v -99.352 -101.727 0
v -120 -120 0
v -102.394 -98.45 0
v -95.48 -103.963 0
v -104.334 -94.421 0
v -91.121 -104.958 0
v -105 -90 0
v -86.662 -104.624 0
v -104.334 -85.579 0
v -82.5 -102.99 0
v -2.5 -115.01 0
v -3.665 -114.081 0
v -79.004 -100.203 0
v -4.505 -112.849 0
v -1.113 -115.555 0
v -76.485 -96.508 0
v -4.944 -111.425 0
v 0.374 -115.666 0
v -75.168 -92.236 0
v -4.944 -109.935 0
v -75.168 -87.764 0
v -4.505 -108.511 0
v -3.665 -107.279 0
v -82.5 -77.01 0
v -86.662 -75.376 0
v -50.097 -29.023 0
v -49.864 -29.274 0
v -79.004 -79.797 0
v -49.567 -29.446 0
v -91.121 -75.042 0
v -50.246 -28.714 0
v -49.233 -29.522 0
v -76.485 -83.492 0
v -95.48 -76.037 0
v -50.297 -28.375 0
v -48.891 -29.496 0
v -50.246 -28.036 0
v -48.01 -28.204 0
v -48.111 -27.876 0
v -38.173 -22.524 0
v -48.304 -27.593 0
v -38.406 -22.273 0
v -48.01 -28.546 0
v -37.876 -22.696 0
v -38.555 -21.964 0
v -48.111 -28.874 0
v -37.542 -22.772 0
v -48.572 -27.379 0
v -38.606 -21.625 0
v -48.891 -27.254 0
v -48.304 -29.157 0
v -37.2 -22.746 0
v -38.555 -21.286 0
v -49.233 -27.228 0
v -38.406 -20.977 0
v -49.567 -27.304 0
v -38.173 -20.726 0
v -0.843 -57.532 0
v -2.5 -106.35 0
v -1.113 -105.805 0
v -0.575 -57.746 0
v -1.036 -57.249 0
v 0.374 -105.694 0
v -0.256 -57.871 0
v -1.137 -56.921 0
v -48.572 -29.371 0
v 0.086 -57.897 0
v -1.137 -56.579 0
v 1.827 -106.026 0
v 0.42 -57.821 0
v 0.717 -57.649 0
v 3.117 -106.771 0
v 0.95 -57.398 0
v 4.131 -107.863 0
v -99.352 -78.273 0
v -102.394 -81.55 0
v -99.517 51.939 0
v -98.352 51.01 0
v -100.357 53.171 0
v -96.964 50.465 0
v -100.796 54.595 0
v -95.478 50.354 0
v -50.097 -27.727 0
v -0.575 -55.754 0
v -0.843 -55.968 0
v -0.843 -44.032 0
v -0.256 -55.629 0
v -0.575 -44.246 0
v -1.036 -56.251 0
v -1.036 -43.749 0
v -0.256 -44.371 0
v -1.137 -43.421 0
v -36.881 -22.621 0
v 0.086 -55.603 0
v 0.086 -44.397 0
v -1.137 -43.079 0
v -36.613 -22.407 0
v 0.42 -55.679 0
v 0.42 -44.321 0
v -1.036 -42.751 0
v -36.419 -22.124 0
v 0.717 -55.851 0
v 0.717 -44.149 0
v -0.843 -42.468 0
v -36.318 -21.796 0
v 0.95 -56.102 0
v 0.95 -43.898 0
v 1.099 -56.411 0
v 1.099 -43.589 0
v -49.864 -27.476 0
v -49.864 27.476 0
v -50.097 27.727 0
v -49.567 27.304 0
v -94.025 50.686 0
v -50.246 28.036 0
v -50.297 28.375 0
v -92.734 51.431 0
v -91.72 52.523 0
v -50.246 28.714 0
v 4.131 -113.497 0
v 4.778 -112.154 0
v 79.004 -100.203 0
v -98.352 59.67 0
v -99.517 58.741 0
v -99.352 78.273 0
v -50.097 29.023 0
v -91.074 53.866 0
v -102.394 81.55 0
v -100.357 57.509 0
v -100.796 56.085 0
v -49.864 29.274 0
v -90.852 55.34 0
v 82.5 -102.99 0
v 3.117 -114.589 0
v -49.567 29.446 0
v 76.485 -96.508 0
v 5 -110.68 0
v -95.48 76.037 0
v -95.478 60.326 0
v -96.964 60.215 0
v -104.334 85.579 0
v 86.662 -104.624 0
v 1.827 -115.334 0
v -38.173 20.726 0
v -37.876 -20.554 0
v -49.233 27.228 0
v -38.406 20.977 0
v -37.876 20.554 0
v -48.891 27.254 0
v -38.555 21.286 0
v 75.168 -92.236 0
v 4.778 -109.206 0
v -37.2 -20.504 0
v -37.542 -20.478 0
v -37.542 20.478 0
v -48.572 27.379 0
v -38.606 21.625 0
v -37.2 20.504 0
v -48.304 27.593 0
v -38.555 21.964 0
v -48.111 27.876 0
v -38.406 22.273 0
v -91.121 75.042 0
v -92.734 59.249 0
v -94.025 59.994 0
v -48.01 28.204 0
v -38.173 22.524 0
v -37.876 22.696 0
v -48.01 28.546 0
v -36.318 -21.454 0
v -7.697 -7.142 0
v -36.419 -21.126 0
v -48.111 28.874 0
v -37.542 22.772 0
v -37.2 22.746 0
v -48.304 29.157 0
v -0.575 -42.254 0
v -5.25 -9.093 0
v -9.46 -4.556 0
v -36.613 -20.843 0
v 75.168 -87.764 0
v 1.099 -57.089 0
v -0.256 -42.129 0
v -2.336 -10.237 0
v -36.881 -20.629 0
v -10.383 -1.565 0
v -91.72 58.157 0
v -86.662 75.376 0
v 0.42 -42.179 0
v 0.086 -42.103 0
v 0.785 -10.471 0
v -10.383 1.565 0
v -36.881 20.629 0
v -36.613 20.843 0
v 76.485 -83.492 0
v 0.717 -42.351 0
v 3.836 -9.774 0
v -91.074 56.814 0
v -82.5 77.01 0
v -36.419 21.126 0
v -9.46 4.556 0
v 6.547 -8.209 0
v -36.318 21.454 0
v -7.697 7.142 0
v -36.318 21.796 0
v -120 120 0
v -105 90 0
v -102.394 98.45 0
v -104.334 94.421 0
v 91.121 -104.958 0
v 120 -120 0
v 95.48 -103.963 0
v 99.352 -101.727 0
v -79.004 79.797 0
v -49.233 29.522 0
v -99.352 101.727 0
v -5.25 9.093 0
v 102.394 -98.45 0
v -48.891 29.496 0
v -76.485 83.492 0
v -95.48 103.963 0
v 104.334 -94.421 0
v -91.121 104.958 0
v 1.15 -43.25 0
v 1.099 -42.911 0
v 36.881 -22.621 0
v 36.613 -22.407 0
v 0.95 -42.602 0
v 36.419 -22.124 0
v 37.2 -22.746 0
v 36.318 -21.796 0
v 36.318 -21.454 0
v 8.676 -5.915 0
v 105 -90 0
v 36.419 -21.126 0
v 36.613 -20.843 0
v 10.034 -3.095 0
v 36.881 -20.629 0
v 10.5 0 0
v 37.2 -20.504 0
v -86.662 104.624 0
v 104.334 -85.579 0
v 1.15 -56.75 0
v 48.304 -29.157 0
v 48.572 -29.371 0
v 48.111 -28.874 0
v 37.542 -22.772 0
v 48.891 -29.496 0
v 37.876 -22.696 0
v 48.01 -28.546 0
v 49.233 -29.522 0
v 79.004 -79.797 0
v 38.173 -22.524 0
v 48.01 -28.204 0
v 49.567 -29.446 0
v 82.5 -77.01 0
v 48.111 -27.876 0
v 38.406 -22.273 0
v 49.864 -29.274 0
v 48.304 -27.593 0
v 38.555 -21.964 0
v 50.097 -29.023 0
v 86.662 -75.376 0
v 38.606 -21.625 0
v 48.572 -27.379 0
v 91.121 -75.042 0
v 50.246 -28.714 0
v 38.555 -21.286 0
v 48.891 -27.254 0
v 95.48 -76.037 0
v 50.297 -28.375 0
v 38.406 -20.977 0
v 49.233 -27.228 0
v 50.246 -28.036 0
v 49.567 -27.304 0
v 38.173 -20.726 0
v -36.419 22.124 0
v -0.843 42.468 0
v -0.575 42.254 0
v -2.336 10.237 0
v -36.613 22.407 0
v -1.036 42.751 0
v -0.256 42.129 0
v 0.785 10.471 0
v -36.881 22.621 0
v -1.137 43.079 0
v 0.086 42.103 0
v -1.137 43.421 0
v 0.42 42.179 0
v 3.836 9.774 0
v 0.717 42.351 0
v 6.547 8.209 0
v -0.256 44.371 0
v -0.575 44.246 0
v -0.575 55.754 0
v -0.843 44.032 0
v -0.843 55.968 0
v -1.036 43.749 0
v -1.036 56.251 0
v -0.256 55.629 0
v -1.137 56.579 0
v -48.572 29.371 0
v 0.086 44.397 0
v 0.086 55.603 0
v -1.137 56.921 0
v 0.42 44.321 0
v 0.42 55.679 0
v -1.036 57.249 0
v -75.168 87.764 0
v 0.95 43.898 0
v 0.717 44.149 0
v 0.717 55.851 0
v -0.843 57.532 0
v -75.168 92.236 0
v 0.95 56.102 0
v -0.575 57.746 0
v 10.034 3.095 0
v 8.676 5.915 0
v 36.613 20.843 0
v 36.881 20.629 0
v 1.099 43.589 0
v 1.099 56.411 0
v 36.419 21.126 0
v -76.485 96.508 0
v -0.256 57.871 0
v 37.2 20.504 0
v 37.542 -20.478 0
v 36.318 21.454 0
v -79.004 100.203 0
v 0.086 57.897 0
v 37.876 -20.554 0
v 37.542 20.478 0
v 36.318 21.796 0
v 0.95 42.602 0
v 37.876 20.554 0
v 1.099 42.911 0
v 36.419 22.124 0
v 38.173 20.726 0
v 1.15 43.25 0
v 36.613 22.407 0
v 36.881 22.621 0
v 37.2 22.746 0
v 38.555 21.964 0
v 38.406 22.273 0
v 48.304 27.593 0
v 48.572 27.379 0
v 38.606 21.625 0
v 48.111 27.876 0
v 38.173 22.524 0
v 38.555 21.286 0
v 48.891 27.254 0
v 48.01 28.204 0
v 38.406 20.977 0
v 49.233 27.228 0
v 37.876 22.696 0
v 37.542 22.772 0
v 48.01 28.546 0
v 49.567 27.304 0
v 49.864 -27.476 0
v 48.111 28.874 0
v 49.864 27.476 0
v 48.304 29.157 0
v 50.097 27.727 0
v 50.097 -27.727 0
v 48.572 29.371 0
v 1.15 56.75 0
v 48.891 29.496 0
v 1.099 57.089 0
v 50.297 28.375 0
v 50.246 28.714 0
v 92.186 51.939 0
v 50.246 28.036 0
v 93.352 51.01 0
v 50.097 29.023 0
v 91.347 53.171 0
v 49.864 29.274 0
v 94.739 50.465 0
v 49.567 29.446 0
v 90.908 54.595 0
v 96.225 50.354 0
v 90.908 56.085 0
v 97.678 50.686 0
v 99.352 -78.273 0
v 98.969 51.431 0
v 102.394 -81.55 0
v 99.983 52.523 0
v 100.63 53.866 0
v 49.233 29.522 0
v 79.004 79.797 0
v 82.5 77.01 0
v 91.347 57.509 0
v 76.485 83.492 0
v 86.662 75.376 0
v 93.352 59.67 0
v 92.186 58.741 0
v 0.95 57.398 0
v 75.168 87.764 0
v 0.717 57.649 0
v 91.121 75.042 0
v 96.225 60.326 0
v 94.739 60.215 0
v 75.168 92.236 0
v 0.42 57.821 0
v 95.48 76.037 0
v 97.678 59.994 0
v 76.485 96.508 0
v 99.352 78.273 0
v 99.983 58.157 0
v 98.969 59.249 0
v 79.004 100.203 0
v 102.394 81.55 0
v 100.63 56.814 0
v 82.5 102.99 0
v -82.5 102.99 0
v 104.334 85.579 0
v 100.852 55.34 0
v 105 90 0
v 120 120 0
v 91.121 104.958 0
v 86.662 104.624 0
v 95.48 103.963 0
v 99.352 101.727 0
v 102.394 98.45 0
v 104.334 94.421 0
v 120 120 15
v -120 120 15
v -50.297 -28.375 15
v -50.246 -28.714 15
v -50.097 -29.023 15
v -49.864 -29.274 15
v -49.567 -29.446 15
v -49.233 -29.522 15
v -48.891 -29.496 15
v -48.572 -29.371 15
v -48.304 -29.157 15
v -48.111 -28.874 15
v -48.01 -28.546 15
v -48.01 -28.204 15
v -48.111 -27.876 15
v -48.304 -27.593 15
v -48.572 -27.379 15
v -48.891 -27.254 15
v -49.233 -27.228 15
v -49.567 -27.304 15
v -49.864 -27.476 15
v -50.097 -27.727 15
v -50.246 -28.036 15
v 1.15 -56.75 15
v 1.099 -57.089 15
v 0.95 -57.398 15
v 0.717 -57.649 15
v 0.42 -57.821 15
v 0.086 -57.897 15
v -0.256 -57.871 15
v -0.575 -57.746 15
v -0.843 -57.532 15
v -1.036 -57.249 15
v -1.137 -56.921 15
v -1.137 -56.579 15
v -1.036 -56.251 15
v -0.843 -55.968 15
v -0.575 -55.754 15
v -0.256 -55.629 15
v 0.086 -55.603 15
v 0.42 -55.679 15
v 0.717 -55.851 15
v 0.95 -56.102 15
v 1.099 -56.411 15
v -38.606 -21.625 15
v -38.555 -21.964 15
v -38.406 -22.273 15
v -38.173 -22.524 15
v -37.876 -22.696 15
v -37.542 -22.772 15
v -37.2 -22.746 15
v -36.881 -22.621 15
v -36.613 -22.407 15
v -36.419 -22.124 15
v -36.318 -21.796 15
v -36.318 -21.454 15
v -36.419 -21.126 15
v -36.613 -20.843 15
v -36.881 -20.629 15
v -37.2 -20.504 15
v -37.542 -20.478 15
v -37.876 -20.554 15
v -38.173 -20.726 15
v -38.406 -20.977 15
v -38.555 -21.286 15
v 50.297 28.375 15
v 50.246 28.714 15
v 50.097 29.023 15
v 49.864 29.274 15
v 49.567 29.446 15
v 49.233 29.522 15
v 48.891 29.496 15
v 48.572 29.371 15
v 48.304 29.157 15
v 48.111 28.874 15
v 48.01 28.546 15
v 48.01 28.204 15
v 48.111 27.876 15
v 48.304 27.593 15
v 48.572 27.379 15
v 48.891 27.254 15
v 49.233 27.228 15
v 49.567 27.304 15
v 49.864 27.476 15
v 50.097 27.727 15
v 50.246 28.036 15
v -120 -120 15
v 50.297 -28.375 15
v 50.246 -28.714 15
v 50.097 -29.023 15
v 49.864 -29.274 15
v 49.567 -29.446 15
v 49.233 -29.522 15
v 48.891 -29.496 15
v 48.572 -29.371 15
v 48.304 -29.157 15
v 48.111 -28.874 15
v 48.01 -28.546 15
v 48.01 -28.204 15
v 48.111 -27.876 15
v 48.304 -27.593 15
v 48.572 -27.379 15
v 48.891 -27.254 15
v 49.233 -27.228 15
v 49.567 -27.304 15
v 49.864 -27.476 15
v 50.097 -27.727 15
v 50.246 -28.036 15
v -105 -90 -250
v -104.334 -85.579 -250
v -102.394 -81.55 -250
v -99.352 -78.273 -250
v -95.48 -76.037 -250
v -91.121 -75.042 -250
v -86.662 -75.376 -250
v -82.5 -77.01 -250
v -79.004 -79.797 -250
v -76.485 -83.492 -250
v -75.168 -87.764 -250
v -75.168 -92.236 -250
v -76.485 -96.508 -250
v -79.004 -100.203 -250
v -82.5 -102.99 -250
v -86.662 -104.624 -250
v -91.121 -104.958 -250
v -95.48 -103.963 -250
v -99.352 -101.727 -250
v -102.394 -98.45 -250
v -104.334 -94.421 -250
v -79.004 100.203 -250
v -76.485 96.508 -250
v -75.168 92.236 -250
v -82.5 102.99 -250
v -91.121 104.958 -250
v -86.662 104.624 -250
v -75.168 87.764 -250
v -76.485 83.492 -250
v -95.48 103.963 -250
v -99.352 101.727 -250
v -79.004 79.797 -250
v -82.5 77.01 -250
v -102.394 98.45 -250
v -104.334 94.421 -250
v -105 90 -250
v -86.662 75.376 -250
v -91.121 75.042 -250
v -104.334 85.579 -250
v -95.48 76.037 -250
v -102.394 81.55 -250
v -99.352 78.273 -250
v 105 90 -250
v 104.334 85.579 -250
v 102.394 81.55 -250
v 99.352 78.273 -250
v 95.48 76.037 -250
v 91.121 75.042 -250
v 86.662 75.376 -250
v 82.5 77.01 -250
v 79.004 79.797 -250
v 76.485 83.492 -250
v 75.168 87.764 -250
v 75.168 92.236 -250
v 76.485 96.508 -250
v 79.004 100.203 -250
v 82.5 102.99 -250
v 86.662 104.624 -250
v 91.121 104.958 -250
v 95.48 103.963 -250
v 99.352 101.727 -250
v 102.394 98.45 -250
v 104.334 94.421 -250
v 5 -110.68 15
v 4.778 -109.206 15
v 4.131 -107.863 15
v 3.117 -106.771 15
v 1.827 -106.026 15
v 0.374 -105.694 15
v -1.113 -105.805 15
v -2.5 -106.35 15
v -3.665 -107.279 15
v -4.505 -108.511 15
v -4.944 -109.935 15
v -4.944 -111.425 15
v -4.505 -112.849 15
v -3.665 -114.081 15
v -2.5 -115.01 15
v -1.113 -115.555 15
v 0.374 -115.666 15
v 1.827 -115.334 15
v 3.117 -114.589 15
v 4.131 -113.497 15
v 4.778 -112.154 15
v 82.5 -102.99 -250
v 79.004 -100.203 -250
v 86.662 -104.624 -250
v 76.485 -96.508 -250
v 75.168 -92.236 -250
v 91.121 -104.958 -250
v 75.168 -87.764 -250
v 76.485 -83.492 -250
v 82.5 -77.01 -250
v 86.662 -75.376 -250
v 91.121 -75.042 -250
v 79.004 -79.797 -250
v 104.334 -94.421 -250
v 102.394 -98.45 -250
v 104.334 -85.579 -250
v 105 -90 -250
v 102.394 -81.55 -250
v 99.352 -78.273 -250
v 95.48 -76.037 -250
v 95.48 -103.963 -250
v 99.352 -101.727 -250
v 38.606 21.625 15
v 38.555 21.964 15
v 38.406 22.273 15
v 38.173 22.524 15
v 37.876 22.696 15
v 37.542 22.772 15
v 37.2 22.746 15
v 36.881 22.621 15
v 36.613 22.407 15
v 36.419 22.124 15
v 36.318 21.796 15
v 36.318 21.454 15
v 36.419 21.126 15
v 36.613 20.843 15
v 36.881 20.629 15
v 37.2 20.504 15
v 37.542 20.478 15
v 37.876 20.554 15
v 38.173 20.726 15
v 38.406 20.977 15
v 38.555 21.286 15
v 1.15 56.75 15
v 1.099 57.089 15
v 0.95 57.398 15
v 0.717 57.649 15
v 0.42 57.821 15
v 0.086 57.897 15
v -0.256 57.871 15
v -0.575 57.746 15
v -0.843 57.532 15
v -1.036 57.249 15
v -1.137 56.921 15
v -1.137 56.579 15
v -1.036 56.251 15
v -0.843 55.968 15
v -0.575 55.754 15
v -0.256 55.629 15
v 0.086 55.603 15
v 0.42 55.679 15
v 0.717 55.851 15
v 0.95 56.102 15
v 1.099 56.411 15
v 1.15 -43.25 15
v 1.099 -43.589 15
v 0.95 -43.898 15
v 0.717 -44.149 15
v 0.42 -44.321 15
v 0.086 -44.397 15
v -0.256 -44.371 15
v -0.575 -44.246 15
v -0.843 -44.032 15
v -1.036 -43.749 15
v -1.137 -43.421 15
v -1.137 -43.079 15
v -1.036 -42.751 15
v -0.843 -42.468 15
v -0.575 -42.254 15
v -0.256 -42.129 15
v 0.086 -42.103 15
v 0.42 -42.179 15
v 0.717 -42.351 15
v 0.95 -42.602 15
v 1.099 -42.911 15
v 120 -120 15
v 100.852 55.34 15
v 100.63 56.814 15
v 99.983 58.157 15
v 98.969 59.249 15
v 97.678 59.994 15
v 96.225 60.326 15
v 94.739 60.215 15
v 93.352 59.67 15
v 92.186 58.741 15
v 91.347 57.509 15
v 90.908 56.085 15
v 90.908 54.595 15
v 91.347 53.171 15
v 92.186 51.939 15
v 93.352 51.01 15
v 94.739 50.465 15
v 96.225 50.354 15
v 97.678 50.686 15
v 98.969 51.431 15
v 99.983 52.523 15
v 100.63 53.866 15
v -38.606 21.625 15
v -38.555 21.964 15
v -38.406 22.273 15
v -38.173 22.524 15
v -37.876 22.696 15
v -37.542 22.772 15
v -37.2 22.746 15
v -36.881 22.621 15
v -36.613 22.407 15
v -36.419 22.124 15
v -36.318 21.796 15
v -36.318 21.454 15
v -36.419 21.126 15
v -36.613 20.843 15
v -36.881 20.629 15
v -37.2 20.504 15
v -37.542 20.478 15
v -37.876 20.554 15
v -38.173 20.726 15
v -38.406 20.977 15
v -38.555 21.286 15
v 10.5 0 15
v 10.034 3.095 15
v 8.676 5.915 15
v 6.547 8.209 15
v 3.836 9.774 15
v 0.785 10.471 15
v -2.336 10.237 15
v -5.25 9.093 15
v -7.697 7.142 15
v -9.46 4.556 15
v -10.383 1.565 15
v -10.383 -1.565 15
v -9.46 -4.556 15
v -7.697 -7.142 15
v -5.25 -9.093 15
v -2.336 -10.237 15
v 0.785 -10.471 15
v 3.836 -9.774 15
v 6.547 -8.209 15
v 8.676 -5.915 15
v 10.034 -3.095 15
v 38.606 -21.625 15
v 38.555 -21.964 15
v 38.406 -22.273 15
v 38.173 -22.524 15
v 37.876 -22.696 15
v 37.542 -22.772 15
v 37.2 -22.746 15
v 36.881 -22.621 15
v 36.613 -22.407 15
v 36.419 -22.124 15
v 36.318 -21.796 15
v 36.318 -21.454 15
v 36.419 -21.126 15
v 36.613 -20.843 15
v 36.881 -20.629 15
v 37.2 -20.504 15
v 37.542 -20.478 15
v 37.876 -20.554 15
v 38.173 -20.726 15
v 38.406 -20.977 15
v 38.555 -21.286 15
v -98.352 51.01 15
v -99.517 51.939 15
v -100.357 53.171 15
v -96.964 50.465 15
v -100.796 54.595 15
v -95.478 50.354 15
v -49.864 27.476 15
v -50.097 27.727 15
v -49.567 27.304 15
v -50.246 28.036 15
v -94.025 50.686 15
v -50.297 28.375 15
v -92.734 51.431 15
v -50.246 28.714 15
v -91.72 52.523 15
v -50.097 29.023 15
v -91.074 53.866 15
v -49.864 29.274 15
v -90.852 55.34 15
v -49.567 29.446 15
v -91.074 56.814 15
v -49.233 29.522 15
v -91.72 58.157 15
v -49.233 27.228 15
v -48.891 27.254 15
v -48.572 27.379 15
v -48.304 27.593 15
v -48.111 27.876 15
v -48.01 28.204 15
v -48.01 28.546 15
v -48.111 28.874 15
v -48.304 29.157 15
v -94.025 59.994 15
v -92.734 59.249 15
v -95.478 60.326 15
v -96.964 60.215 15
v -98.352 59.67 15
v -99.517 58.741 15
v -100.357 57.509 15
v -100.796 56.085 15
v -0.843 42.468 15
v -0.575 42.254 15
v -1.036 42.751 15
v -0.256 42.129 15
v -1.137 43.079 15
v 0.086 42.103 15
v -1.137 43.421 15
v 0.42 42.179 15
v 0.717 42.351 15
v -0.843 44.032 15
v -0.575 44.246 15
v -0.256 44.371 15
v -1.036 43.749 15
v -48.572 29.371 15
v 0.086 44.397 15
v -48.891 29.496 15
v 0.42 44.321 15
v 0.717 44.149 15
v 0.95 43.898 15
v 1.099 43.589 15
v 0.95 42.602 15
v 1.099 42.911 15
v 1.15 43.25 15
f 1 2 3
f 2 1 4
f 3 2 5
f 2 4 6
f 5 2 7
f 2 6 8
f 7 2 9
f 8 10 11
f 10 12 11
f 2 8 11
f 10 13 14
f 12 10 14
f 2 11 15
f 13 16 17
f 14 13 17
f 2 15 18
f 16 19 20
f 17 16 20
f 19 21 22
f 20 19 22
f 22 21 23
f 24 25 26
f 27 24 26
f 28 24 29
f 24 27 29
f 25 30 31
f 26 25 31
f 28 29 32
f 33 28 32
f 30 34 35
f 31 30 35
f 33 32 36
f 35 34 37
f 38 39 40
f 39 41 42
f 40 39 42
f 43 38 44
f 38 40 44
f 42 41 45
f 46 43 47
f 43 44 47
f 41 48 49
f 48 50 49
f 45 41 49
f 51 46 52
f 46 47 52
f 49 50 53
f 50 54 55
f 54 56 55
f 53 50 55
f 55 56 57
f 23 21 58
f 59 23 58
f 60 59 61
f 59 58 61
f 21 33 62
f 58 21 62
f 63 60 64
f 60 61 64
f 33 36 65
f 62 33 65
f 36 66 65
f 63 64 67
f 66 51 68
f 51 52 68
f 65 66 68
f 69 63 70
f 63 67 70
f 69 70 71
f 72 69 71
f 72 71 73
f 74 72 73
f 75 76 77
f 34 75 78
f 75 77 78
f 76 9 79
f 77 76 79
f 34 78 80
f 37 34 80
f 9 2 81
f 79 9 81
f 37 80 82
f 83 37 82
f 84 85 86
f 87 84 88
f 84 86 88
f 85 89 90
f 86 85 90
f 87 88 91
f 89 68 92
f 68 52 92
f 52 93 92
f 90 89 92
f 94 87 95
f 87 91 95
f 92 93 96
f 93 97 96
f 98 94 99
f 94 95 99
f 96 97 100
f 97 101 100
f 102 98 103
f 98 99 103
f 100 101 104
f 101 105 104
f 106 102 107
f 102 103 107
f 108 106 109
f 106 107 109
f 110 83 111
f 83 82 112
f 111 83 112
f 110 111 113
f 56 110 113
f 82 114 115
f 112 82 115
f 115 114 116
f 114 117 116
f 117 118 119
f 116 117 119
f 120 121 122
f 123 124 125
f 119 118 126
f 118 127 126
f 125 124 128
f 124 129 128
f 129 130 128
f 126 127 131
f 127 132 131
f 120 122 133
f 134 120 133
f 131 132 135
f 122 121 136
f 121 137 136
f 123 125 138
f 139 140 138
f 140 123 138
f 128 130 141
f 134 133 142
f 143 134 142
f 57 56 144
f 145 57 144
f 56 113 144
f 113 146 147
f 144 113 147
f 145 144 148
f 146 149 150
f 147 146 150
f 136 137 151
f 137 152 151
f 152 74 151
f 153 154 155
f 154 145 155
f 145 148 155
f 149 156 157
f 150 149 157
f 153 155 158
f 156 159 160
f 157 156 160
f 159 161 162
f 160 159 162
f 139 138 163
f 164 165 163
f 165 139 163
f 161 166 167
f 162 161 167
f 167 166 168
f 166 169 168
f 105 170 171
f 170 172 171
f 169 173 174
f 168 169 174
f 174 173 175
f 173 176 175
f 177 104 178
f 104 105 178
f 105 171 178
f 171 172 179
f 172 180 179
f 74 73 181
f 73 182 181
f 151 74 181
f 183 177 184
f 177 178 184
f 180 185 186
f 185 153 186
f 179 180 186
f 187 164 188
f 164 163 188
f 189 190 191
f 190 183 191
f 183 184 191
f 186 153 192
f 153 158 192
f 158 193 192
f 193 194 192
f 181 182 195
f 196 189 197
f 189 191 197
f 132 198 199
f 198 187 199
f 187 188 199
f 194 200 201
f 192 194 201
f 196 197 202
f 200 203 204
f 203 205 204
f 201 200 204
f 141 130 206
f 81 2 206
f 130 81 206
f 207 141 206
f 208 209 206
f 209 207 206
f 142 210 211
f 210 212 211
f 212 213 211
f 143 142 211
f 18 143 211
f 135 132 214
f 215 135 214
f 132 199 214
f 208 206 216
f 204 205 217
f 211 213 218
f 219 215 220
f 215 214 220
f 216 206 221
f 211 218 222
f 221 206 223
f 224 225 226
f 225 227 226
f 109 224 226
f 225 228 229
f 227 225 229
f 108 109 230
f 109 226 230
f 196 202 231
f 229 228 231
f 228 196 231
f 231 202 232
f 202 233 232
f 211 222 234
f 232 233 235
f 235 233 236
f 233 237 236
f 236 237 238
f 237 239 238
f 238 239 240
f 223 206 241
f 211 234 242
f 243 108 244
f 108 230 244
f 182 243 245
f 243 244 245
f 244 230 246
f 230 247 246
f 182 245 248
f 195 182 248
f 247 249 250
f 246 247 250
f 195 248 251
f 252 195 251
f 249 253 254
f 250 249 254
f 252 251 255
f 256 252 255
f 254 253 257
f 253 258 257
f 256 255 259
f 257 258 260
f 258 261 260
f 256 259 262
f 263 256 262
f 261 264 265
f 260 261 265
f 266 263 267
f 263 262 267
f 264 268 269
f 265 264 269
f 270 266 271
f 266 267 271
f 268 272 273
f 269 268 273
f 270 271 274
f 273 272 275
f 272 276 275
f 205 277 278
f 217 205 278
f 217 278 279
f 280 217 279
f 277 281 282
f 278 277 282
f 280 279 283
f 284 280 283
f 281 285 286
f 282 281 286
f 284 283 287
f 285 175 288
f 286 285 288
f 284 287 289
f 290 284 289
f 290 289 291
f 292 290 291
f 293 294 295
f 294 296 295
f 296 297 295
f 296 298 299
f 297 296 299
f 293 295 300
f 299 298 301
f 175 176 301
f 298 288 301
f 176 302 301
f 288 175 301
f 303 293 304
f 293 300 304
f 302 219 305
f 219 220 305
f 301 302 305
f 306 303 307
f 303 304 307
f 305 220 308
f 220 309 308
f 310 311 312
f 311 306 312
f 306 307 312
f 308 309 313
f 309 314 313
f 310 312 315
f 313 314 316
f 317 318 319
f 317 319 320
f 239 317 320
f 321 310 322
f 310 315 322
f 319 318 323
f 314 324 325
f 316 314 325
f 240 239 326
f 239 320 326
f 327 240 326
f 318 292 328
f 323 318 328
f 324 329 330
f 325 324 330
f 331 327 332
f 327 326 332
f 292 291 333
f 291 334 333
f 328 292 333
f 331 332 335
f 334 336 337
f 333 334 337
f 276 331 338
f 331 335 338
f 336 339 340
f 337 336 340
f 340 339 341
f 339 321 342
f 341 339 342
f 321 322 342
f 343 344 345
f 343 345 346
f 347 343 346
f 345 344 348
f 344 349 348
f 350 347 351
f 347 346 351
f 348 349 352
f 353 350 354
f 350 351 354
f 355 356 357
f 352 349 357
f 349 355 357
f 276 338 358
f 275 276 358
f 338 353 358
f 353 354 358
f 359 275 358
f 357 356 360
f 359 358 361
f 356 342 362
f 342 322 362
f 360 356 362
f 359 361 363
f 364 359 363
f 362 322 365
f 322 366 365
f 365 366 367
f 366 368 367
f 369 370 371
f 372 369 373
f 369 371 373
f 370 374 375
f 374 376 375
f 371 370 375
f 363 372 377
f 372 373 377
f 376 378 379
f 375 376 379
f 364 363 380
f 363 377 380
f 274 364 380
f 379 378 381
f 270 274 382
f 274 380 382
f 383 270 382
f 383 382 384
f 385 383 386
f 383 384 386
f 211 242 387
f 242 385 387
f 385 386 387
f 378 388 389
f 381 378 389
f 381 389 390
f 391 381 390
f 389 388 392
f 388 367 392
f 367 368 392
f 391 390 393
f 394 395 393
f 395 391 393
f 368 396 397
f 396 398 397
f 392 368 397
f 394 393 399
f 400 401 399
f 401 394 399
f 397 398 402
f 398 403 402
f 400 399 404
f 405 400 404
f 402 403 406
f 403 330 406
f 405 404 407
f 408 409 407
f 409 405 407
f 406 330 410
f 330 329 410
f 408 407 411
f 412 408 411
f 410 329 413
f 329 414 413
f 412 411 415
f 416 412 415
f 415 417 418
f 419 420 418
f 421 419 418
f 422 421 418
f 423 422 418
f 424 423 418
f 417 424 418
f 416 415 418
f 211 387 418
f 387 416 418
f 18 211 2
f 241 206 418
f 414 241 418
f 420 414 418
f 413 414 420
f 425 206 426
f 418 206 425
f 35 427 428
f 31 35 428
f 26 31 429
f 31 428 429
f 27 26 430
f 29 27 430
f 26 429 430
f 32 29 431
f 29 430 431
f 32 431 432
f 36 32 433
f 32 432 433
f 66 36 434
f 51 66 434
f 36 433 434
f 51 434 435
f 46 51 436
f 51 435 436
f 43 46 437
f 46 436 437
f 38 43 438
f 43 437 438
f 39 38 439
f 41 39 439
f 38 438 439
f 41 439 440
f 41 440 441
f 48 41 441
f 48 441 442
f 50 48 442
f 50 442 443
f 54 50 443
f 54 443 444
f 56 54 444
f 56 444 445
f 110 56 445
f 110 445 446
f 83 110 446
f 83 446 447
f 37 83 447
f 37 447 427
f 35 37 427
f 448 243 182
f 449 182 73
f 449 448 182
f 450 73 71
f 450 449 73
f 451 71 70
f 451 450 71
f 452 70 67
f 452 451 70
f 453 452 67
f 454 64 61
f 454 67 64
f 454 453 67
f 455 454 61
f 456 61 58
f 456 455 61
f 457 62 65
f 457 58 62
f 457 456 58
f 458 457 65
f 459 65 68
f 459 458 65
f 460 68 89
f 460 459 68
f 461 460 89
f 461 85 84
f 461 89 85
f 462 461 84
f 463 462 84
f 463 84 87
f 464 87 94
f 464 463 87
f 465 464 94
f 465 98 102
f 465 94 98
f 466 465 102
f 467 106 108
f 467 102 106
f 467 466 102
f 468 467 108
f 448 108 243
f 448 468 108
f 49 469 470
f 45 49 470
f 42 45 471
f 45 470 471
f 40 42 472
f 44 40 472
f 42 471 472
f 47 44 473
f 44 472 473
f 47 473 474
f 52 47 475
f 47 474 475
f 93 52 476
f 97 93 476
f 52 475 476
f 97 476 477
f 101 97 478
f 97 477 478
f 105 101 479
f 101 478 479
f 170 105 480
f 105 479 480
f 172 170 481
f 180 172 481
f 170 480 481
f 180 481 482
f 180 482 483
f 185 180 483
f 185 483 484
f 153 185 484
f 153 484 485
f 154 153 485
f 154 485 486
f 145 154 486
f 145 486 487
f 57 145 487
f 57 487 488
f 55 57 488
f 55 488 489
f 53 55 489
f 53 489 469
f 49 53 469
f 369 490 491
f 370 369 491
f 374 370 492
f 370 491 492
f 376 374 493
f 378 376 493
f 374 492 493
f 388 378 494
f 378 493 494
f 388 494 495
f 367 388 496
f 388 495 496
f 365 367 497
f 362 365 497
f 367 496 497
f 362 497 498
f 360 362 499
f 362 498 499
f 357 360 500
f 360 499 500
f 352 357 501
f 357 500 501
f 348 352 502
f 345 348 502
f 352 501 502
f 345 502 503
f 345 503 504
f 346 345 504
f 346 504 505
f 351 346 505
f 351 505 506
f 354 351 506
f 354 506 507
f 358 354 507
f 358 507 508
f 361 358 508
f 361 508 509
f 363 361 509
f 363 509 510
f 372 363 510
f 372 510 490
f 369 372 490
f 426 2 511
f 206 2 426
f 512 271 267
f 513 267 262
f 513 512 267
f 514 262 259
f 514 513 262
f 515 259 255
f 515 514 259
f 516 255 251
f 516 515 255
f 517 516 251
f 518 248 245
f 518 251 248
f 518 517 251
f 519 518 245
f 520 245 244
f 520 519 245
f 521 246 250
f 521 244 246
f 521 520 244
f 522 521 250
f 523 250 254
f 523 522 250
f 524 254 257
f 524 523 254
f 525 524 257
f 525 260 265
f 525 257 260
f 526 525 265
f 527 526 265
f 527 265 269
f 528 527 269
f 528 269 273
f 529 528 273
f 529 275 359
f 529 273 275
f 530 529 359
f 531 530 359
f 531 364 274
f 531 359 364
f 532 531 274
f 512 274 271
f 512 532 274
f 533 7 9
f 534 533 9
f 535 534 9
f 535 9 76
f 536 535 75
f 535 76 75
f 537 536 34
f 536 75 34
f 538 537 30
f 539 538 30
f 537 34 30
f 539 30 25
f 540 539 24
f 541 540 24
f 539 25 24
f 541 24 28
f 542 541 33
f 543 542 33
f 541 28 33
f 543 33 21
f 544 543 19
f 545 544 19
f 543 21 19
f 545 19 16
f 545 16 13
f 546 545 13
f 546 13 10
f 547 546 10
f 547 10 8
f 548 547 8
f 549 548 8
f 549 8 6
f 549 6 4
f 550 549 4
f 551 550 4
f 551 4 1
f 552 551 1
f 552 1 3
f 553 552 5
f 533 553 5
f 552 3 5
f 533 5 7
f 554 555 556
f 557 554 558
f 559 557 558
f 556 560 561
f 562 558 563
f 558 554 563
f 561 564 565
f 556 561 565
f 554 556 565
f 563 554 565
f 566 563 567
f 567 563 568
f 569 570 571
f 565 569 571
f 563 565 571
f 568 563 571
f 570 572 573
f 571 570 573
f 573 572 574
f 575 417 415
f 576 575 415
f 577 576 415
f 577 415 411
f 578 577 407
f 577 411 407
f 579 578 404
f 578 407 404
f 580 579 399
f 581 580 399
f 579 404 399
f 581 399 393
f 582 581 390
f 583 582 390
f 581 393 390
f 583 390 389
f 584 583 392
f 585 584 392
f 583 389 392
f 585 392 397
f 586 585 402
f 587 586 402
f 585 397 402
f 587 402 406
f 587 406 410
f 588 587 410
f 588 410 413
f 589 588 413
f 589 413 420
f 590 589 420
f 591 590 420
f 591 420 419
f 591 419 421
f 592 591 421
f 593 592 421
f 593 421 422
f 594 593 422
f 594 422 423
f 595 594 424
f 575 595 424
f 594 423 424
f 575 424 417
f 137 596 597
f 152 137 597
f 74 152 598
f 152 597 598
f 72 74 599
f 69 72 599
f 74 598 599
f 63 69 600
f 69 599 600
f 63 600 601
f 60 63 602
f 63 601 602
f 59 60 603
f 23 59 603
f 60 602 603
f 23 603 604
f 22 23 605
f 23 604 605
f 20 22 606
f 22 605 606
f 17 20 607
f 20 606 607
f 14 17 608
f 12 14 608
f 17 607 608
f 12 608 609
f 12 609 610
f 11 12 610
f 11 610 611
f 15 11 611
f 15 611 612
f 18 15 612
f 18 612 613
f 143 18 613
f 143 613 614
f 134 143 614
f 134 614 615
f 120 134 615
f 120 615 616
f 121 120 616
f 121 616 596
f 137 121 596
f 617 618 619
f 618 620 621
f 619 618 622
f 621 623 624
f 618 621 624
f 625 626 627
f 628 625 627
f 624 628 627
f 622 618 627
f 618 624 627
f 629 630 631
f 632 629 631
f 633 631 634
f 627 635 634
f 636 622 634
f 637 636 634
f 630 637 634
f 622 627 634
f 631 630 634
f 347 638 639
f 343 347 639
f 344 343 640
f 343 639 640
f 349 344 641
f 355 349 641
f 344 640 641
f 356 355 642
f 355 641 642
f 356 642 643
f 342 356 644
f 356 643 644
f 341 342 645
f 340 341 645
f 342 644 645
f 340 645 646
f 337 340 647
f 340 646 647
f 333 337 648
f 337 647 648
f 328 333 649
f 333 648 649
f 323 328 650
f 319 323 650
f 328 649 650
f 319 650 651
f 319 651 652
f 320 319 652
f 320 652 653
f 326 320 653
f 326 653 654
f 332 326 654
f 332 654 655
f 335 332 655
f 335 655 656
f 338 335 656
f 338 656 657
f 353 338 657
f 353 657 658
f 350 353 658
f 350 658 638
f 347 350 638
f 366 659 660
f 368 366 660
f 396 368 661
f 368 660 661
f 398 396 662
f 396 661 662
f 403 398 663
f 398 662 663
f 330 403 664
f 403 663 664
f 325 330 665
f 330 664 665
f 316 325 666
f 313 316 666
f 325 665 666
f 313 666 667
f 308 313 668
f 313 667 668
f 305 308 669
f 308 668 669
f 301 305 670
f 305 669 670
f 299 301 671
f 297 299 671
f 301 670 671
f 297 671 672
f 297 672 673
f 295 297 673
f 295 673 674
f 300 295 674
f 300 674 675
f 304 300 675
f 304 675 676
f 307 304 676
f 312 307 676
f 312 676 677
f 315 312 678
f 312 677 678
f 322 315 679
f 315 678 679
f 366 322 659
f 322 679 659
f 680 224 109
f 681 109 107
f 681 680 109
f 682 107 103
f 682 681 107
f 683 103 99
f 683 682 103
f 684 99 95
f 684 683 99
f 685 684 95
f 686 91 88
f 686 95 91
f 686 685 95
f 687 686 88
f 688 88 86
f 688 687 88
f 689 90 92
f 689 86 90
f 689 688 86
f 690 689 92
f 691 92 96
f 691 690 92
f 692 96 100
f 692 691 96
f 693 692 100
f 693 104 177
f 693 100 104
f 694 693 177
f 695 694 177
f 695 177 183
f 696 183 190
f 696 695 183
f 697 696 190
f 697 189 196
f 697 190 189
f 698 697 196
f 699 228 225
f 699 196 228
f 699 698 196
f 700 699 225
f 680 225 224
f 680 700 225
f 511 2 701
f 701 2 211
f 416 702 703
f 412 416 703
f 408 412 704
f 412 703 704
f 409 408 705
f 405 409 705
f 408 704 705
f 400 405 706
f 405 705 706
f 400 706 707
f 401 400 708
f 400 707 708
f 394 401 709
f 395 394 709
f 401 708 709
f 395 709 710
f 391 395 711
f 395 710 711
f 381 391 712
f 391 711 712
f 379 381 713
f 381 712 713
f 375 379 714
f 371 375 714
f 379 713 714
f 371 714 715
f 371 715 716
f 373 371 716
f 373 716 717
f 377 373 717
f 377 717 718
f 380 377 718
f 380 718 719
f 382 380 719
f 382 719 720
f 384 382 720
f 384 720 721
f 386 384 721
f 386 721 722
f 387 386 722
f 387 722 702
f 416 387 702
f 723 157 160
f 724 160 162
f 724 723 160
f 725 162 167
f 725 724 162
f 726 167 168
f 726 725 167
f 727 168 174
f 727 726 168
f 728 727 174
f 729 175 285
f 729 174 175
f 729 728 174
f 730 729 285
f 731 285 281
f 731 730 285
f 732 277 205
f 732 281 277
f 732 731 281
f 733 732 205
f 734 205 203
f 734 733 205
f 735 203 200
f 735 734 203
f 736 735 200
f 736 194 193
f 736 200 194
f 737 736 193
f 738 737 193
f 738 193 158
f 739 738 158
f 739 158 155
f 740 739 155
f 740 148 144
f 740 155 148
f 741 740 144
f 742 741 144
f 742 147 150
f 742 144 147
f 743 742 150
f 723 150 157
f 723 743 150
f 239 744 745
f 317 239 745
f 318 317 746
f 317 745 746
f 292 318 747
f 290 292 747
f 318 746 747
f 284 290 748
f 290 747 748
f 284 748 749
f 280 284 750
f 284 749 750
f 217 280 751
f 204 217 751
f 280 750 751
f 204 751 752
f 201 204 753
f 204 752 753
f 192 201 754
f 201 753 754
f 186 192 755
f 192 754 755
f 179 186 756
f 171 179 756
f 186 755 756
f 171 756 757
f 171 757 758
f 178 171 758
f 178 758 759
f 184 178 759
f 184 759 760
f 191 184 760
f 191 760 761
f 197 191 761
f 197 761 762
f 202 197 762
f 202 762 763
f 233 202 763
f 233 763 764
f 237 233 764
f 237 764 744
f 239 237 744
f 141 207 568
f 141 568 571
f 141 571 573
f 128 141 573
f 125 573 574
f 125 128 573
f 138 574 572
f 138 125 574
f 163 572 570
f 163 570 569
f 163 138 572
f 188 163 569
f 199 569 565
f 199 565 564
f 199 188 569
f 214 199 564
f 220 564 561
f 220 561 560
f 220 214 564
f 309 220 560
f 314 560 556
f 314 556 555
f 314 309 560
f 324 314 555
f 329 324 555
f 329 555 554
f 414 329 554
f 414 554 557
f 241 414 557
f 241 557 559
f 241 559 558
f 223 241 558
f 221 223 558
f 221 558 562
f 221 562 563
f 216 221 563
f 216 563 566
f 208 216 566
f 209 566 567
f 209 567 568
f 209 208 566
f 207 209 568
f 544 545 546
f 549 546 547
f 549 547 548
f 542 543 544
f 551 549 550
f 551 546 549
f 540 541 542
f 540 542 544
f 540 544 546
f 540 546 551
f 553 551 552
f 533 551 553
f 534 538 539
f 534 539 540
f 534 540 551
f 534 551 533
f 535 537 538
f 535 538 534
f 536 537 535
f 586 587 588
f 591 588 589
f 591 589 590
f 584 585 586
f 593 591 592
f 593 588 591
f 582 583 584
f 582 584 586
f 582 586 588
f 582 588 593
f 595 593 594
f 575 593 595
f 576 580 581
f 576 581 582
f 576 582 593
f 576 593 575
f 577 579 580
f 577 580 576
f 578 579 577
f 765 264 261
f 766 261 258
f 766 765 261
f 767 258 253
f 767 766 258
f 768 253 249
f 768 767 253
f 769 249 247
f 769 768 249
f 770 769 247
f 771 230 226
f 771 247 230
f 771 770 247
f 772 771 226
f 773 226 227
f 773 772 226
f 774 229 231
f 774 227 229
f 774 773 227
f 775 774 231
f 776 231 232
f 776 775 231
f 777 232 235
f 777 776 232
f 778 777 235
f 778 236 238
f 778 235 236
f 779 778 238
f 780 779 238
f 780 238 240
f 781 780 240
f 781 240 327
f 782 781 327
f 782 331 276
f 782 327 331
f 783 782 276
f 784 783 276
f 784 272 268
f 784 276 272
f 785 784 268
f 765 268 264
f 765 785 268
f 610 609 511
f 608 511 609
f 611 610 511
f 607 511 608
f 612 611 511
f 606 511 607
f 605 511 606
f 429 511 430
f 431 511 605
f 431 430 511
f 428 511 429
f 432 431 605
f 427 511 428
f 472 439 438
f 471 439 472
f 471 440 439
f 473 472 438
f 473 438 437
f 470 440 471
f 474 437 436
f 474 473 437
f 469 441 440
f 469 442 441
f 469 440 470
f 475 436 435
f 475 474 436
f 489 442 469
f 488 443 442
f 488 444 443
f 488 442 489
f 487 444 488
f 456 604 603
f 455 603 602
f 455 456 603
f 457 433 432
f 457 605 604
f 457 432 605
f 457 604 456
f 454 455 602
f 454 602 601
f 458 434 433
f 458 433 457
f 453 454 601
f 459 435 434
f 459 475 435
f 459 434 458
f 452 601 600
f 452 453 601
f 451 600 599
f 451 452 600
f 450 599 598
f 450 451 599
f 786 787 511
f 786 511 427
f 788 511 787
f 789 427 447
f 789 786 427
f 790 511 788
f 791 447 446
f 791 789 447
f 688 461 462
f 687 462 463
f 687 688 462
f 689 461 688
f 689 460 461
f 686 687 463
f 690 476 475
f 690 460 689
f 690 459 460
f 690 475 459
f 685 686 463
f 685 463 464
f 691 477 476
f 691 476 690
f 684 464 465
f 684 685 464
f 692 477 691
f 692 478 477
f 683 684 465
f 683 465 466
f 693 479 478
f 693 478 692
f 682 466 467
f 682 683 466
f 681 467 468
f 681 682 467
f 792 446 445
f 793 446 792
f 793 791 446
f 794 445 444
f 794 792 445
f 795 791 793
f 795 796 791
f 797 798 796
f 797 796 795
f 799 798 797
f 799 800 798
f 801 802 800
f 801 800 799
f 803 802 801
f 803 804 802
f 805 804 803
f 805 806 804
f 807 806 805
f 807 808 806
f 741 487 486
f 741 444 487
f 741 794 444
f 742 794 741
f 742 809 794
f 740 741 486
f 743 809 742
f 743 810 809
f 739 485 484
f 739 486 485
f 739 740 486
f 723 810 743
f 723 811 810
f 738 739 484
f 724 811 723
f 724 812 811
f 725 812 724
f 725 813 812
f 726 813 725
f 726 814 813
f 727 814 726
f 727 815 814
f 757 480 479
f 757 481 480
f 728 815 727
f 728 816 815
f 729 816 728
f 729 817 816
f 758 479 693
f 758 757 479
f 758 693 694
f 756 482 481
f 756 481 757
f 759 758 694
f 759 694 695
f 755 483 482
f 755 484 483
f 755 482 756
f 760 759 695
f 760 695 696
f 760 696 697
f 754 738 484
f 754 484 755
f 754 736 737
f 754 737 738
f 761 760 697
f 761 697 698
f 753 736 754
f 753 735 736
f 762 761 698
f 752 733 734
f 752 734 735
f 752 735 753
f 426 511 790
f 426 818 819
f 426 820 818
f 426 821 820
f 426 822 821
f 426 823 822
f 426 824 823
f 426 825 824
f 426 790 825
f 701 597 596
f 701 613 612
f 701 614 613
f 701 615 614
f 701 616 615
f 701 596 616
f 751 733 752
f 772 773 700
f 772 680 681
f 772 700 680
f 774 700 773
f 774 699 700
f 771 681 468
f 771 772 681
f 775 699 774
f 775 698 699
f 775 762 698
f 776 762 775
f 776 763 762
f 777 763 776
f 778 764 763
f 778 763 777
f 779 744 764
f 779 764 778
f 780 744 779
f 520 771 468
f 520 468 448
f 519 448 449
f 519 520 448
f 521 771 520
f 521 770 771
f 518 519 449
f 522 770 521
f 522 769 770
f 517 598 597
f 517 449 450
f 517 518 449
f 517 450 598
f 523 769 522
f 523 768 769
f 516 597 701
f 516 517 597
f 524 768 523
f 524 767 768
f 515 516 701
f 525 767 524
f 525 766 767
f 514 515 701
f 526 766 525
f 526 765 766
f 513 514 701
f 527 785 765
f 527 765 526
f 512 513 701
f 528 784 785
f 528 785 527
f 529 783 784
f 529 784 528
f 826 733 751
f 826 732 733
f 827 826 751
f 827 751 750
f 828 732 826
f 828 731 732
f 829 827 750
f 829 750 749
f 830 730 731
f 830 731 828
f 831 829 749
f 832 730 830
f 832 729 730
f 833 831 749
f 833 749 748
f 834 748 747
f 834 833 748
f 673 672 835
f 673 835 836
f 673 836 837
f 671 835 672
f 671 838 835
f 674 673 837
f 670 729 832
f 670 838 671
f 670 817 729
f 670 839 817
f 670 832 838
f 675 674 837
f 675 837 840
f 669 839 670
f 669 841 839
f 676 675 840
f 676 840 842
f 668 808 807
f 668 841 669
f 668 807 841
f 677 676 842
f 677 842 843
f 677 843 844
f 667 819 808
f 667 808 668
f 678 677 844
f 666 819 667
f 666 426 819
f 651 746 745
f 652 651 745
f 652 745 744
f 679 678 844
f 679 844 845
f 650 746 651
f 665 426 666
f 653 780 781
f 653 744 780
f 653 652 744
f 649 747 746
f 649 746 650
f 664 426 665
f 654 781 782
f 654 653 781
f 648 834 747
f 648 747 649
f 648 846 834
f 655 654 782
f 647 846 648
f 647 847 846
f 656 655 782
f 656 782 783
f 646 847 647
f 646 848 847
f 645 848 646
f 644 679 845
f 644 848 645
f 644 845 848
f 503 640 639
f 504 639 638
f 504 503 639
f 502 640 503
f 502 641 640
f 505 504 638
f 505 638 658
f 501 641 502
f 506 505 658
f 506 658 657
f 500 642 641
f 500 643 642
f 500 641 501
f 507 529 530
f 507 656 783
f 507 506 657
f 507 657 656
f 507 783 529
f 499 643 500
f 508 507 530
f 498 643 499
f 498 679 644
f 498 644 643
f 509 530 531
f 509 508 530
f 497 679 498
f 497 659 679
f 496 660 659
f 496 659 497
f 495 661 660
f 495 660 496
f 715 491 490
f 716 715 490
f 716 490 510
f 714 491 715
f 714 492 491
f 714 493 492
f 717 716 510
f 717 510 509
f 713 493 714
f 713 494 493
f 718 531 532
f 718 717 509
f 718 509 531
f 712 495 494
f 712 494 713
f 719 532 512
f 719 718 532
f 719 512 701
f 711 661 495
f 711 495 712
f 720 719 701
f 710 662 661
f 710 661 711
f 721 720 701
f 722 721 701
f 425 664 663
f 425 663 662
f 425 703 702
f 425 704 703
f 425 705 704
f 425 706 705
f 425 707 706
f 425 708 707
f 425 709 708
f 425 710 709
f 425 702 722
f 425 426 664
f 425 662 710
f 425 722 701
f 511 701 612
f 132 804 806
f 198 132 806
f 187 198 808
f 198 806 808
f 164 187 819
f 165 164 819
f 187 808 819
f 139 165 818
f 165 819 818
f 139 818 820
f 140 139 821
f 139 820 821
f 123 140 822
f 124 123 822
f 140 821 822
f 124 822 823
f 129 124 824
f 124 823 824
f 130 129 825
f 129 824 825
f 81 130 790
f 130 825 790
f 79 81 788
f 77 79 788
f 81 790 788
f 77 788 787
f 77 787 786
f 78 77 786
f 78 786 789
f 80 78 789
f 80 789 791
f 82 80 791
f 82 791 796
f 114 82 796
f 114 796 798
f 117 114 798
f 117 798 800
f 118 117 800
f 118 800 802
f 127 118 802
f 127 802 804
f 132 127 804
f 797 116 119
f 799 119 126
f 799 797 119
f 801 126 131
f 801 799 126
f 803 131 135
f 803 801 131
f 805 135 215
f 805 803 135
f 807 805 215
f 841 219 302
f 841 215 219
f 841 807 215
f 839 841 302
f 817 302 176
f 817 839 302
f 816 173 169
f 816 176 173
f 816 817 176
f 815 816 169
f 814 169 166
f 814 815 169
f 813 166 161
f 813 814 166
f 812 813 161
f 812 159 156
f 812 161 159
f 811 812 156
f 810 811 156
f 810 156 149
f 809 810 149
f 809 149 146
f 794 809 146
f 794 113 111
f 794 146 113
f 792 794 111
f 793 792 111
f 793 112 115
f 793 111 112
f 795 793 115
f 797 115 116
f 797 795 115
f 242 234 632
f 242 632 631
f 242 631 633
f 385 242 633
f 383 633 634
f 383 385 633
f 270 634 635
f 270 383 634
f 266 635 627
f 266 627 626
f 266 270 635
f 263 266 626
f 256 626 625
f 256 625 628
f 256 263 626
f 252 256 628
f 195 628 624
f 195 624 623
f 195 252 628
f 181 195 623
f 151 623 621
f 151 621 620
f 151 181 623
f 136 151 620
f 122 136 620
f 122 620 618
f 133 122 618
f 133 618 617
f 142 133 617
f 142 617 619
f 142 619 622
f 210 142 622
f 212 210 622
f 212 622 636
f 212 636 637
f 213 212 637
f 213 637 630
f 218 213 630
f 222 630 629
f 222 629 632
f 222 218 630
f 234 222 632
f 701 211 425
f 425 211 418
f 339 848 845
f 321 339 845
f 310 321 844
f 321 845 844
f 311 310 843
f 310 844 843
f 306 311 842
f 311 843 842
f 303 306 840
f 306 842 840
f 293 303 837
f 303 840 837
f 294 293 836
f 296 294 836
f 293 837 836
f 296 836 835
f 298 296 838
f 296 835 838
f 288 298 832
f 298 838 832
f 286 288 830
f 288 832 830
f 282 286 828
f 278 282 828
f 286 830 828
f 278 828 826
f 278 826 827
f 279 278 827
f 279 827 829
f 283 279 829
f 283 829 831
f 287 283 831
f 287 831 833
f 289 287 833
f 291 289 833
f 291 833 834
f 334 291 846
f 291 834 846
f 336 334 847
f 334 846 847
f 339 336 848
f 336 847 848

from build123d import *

# Parameters (mm, degrees)
SKETCH1_W               = 240
SKETCH1_H               = 240
BOSS_EXTRUDE1_DEPTH     = 15
SKETCH3_R               = 15
BOSS_EXTRUDE3_DEPTH     = 250
MIRROR7_COPY_1_SKETCH_R = 15
MIRROR7_COPY_1_DEPTH    = 250
SKETCH4_R               = 10.5
CUT_EXTRUDE1_DEPTH      = 250
SKETCH5_R               = 1.15
CUT_EXTRUDE2_DEPTH      = 40
MIRROR9_COPY_1_SKETCH_R = 1.15
MIRROR9_COPY_1_DEPTH    = 40
SKETCH6_R               = 5
CUT_EXTRUDE3_DEPTH      = 30


with BuildPart() as part:
    # Sketch1 → Boss-Extrude1 (new body)
    with BuildSketch(Plane.XY):
        Rectangle(SKETCH1_W, SKETCH1_H)
    extrude(amount=BOSS_EXTRUDE1_DEPTH)

    # Sketch3 → Boss-Extrude3 (add)
    with BuildSketch(Plane(origin=(0, 0, 0), x_dir=(-1, 0, 0), z_dir=(0, 0, -1))):
        with Locations((90, -90)):
            Circle(SKETCH3_R)
    boss_extrude3 = extrude(amount=BOSS_EXTRUDE3_DEPTH)

    # Mirror6: Boss-Extrude3 across plane
    add(boss_extrude3.mirror(Plane.ZX))

    # Mirror7: Boss-Extrude3 across plane
    add(boss_extrude3.mirror(Plane(origin=(0, 0, 0), x_dir=(0, 0, 1), z_dir=(1, 0, 0))))

    # Mirror7 copy 1 sketch → Mirror7 copy 1 (add)
    with BuildSketch(Plane(origin=(0, 0, 0), x_dir=(1, 0, 0), z_dir=(0, 0, -1))):
        with Locations((90, -90)):
            Circle(MIRROR7_COPY_1_SKETCH_R)
    extrude(amount=MIRROR7_COPY_1_DEPTH)

    # Sketch4 → Cut-Extrude1 (cut)
    with BuildSketch(Plane.XY.offset(15)):
        Circle(SKETCH4_R)
    extrude(amount=-CUT_EXTRUDE1_DEPTH, mode=Mode.SUBTRACT)

    # Sketch5 → Cut-Extrude2 (cut)
    with BuildSketch(Plane.XY.offset(15)):
        with Locations((37.455598714, 21.625)):
            Circle(SKETCH5_R)
        with Locations((49.146941665, 28.375)):
            Circle(SKETCH5_R)
        with Locations((0, 43.25)):
            Circle(SKETCH5_R)
        with Locations((0, 56.75)):
            Circle(SKETCH5_R)
    cut_extrude2 = extrude(amount=-CUT_EXTRUDE2_DEPTH, mode=Mode.SUBTRACT)

    # Mirror8: Cut-Extrude2 across plane
    add(cut_extrude2.mirror(Plane.ZX), mode=Mode.SUBTRACT)

    # Mirror9: Cut-Extrude2 across plane
    add(cut_extrude2.mirror(Plane(origin=(0, 0, 0), x_dir=(0, 0, 1), z_dir=(1, 0, 0))), mode=Mode.SUBTRACT)

    # Mirror9 copy 1 sketch → Mirror9 copy 1 (cut)
    with BuildSketch(Plane(origin=(0, 0, 15), x_dir=(-1, 0, 0), z_dir=(0, 0, 1))):
        with Locations((37.455598714, 21.625)):
            Circle(MIRROR9_COPY_1_SKETCH_R)
        with Locations((49.146941665, 28.375)):
            Circle(MIRROR9_COPY_1_SKETCH_R)
        with Locations((0, 43.25)):
            Circle(MIRROR9_COPY_1_SKETCH_R)
        with Locations((0, 56.75)):
            Circle(MIRROR9_COPY_1_SKETCH_R)
    extrude(amount=-MIRROR9_COPY_1_DEPTH, mode=Mode.SUBTRACT)

    # Sketch6 → Cut-Extrude3 (cut)
    with BuildSketch(Plane.XY.offset(15)):
        with Locations((0, -110.68)):
            Circle(SKETCH6_R)
        with Locations((-95.851691691, 55.34)):
            Circle(SKETCH6_R)
        with Locations((95.851691691, 55.34)):
            Circle(SKETCH6_R)
    extrude(amount=-CUT_EXTRUDE3_DEPTH, mode=Mode.SUBTRACT)


solid = part.part
